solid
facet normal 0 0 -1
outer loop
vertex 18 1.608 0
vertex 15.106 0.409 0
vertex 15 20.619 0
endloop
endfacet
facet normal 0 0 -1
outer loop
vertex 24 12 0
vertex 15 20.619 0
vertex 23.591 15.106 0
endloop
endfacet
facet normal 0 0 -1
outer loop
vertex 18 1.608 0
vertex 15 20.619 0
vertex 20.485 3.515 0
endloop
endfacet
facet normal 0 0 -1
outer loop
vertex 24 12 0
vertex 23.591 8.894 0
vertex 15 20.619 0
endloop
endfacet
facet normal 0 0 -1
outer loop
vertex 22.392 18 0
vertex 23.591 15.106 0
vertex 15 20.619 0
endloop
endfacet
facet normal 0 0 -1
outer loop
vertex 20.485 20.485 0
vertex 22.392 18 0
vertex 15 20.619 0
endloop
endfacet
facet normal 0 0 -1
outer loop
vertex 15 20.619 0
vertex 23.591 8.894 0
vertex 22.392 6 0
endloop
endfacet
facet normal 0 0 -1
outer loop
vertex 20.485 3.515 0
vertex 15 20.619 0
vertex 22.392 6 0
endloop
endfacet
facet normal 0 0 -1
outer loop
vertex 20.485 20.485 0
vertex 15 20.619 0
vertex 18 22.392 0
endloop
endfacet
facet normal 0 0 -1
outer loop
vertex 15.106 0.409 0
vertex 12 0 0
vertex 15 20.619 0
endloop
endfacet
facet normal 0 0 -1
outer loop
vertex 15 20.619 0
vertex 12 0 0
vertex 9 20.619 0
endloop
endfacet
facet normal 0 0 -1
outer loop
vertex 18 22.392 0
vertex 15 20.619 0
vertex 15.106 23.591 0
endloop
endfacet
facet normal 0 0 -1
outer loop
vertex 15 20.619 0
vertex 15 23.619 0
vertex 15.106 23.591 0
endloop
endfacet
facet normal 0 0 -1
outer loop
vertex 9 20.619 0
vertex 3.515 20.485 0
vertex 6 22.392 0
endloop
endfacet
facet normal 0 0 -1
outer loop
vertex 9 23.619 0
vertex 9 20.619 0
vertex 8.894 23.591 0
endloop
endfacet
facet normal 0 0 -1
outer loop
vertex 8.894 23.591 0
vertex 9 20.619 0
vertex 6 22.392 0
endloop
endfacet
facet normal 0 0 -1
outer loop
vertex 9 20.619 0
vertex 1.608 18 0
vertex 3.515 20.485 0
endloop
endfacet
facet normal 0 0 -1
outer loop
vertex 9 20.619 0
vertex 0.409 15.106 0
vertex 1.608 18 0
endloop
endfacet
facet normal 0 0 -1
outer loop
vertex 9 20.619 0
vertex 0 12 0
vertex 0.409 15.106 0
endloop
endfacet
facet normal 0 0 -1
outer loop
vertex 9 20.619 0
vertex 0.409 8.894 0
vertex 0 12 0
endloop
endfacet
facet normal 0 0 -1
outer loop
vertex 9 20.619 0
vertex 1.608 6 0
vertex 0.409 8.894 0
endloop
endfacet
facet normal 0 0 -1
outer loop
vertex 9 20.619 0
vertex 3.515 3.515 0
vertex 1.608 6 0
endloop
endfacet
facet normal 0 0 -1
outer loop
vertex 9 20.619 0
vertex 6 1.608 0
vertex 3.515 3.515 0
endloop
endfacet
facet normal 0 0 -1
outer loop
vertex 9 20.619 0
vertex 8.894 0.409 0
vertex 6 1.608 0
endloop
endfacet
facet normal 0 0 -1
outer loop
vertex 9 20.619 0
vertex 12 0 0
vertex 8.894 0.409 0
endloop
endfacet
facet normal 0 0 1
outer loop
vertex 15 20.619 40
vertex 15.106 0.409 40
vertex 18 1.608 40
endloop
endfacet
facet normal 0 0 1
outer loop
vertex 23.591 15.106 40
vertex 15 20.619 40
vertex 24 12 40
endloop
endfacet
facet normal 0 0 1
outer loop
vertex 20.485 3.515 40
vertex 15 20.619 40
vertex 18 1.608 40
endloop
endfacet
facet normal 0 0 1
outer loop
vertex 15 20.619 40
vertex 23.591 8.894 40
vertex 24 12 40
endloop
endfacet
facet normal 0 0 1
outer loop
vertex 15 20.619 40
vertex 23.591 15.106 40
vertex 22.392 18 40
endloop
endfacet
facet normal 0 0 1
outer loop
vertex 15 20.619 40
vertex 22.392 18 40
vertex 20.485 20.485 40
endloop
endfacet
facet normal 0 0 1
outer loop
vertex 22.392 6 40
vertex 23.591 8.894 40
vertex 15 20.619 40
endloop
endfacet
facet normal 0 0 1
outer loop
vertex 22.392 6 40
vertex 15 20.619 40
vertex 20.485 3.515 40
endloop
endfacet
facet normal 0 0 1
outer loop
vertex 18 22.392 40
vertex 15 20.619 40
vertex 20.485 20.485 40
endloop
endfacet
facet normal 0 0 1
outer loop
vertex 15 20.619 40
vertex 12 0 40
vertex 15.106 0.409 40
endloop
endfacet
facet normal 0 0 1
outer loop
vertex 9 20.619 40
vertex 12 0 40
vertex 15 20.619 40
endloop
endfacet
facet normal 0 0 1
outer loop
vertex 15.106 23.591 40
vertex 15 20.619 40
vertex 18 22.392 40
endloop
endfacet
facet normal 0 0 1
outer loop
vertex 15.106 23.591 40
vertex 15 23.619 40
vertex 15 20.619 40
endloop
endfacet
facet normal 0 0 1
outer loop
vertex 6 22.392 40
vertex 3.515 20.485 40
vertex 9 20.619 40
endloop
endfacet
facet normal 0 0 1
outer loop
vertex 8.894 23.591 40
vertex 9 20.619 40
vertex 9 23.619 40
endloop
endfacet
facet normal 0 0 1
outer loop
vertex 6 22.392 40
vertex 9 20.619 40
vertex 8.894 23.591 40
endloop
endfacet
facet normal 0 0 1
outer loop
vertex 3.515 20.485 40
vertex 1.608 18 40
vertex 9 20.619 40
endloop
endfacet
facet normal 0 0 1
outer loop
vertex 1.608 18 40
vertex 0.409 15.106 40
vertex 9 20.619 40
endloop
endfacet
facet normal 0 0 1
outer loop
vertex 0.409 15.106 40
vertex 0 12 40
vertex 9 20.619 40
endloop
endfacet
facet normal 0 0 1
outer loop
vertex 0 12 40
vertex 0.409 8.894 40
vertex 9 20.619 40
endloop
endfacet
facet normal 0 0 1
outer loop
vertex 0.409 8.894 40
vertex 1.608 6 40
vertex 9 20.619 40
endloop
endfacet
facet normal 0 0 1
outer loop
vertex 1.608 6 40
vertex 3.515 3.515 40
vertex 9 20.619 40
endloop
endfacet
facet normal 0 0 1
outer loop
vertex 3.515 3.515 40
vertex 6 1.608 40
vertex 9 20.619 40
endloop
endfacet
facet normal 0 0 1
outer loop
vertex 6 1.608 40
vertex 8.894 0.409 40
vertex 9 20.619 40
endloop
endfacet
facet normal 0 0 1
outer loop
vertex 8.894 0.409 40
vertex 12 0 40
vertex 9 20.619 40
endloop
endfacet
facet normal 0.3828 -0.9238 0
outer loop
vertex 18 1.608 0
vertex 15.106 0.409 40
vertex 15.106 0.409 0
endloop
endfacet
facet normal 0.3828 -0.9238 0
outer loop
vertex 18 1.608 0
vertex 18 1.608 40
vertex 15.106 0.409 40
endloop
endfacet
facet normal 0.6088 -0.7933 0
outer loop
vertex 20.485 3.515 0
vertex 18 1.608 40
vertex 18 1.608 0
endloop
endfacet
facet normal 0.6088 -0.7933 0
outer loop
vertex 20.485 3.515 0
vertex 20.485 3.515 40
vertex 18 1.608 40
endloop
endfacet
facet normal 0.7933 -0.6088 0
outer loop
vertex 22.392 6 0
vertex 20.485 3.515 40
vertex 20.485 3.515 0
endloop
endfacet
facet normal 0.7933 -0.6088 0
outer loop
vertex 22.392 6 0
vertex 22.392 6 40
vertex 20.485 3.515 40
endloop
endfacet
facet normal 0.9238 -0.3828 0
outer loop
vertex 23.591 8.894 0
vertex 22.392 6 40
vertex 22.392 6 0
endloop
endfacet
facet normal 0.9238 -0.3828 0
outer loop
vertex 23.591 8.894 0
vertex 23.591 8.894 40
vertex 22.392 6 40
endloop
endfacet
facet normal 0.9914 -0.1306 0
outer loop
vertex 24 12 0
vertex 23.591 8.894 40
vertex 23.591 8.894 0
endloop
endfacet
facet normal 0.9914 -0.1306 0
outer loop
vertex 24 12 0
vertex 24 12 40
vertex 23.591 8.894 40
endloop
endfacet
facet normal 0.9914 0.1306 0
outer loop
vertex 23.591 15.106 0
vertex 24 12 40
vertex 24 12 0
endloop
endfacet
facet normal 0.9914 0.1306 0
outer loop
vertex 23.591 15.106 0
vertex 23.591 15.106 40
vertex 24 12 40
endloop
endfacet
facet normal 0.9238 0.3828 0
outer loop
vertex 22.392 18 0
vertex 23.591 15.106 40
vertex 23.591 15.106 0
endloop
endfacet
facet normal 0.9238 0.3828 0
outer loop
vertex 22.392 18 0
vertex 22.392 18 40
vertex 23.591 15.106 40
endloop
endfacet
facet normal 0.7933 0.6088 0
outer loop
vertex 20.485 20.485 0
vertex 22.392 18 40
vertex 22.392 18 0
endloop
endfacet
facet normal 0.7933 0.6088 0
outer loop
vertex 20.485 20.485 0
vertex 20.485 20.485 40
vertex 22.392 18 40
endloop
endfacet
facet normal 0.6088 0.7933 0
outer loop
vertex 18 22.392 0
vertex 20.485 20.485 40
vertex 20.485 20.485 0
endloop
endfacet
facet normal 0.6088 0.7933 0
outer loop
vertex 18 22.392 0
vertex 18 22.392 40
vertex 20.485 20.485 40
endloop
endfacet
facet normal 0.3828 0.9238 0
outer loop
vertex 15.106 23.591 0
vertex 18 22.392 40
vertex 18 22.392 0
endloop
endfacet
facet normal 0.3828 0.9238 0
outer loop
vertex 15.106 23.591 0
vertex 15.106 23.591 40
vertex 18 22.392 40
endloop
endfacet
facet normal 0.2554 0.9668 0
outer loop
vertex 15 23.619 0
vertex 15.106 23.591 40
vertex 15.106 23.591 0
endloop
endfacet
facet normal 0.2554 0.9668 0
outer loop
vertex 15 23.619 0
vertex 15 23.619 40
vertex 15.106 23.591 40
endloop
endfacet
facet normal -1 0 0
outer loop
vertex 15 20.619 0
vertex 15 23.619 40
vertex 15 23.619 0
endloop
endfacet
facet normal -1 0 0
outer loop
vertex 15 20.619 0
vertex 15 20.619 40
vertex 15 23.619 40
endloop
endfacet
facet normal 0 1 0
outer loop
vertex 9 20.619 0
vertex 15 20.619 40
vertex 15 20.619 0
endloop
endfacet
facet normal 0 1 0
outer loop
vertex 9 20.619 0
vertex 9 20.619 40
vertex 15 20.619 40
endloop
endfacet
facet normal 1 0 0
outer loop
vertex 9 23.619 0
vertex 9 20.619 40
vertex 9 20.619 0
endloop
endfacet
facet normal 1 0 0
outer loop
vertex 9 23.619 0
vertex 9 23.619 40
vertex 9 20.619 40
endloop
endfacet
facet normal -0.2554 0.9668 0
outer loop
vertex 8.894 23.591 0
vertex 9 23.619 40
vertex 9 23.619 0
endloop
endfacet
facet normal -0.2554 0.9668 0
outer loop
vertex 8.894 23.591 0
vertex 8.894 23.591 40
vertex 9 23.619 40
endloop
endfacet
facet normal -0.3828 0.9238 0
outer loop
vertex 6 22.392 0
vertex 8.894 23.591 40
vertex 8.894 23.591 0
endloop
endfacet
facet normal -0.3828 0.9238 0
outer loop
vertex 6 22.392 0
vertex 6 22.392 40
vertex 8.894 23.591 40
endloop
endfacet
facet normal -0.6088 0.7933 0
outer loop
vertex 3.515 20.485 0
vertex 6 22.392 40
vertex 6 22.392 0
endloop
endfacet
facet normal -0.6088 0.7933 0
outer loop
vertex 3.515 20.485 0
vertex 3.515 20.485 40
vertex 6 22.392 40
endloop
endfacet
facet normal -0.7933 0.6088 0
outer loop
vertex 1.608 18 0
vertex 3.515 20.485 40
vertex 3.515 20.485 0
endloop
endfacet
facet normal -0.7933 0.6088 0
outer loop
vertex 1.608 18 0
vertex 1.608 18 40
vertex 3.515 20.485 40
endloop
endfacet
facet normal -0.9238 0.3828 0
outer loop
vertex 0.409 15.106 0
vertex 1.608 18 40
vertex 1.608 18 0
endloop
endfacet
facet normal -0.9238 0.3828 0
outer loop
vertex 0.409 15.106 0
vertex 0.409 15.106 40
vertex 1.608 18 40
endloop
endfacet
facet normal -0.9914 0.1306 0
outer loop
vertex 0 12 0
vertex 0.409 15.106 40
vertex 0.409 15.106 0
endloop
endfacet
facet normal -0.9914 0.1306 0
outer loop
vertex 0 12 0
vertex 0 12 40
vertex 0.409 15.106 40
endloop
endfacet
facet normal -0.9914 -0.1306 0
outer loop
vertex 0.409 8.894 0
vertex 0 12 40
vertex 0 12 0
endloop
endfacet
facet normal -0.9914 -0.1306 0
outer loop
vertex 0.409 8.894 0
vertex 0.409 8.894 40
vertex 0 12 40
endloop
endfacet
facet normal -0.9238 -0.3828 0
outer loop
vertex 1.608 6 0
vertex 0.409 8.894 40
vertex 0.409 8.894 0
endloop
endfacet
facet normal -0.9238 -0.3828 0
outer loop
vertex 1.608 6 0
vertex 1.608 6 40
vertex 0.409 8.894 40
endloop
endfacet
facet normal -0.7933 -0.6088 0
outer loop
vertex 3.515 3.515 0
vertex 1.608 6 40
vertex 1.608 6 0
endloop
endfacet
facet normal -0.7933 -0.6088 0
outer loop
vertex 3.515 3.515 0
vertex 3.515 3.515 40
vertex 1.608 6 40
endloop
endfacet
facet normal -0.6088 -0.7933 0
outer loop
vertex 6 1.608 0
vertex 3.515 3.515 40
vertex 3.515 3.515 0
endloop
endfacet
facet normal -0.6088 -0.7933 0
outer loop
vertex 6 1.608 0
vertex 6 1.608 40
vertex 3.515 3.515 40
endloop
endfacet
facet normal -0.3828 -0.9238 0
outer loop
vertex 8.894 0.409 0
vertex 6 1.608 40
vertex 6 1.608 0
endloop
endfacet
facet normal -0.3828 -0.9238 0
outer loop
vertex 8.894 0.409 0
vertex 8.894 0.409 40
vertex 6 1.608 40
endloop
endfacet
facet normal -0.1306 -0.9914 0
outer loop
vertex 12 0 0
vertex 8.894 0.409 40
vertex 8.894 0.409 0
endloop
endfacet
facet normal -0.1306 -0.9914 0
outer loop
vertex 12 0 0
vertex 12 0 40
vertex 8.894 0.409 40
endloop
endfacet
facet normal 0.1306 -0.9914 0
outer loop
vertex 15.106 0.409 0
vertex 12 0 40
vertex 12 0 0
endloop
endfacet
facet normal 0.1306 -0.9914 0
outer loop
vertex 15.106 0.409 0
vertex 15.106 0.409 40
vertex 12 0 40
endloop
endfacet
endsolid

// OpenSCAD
$fn = 32;

// ----------------------------------------------------------------------
// Keyway shaft: d24 shaft, key 6 x 3 mm
// ----------------------------------------------------------------------

// --- parameters (mm) ---
shaft_r = 12;             // shaft radius
key_w = 6;                // keyway width
key_d = 3;                // keyway depth below the surface line
plate_t = 40;             // shaft length, Z (extrusion height)

shaft_d = 2 * shaft_r;  // shaft diameter
circle_step = 15;  // polygon sampling step, degrees

profile = [[8.894, 23.591], [6, 22.392], [3.515, 20.485], [1.608, 18], [0.409, 15.106], [0, 12], [0.409, 8.894], [1.608, 6], [3.515, 3.515], [6, 1.608], [8.894, 0.409], [12, 0], [15.106, 0.409], [18, 1.608], [20.485, 3.515], [22.392, 6], [23.591, 8.894], [24, 12], [23.591, 15.106], [22.392, 18], [20.485, 20.485], [18, 22.392], [15.106, 23.591], [15, 23.619], [15, 20.619], [9, 20.619], [9, 23.619]];  // primary outline, 27 points, counter clockwise

// --- the one profile operation ---
linear_extrude(height = plate_t) polygon(points = profile);
